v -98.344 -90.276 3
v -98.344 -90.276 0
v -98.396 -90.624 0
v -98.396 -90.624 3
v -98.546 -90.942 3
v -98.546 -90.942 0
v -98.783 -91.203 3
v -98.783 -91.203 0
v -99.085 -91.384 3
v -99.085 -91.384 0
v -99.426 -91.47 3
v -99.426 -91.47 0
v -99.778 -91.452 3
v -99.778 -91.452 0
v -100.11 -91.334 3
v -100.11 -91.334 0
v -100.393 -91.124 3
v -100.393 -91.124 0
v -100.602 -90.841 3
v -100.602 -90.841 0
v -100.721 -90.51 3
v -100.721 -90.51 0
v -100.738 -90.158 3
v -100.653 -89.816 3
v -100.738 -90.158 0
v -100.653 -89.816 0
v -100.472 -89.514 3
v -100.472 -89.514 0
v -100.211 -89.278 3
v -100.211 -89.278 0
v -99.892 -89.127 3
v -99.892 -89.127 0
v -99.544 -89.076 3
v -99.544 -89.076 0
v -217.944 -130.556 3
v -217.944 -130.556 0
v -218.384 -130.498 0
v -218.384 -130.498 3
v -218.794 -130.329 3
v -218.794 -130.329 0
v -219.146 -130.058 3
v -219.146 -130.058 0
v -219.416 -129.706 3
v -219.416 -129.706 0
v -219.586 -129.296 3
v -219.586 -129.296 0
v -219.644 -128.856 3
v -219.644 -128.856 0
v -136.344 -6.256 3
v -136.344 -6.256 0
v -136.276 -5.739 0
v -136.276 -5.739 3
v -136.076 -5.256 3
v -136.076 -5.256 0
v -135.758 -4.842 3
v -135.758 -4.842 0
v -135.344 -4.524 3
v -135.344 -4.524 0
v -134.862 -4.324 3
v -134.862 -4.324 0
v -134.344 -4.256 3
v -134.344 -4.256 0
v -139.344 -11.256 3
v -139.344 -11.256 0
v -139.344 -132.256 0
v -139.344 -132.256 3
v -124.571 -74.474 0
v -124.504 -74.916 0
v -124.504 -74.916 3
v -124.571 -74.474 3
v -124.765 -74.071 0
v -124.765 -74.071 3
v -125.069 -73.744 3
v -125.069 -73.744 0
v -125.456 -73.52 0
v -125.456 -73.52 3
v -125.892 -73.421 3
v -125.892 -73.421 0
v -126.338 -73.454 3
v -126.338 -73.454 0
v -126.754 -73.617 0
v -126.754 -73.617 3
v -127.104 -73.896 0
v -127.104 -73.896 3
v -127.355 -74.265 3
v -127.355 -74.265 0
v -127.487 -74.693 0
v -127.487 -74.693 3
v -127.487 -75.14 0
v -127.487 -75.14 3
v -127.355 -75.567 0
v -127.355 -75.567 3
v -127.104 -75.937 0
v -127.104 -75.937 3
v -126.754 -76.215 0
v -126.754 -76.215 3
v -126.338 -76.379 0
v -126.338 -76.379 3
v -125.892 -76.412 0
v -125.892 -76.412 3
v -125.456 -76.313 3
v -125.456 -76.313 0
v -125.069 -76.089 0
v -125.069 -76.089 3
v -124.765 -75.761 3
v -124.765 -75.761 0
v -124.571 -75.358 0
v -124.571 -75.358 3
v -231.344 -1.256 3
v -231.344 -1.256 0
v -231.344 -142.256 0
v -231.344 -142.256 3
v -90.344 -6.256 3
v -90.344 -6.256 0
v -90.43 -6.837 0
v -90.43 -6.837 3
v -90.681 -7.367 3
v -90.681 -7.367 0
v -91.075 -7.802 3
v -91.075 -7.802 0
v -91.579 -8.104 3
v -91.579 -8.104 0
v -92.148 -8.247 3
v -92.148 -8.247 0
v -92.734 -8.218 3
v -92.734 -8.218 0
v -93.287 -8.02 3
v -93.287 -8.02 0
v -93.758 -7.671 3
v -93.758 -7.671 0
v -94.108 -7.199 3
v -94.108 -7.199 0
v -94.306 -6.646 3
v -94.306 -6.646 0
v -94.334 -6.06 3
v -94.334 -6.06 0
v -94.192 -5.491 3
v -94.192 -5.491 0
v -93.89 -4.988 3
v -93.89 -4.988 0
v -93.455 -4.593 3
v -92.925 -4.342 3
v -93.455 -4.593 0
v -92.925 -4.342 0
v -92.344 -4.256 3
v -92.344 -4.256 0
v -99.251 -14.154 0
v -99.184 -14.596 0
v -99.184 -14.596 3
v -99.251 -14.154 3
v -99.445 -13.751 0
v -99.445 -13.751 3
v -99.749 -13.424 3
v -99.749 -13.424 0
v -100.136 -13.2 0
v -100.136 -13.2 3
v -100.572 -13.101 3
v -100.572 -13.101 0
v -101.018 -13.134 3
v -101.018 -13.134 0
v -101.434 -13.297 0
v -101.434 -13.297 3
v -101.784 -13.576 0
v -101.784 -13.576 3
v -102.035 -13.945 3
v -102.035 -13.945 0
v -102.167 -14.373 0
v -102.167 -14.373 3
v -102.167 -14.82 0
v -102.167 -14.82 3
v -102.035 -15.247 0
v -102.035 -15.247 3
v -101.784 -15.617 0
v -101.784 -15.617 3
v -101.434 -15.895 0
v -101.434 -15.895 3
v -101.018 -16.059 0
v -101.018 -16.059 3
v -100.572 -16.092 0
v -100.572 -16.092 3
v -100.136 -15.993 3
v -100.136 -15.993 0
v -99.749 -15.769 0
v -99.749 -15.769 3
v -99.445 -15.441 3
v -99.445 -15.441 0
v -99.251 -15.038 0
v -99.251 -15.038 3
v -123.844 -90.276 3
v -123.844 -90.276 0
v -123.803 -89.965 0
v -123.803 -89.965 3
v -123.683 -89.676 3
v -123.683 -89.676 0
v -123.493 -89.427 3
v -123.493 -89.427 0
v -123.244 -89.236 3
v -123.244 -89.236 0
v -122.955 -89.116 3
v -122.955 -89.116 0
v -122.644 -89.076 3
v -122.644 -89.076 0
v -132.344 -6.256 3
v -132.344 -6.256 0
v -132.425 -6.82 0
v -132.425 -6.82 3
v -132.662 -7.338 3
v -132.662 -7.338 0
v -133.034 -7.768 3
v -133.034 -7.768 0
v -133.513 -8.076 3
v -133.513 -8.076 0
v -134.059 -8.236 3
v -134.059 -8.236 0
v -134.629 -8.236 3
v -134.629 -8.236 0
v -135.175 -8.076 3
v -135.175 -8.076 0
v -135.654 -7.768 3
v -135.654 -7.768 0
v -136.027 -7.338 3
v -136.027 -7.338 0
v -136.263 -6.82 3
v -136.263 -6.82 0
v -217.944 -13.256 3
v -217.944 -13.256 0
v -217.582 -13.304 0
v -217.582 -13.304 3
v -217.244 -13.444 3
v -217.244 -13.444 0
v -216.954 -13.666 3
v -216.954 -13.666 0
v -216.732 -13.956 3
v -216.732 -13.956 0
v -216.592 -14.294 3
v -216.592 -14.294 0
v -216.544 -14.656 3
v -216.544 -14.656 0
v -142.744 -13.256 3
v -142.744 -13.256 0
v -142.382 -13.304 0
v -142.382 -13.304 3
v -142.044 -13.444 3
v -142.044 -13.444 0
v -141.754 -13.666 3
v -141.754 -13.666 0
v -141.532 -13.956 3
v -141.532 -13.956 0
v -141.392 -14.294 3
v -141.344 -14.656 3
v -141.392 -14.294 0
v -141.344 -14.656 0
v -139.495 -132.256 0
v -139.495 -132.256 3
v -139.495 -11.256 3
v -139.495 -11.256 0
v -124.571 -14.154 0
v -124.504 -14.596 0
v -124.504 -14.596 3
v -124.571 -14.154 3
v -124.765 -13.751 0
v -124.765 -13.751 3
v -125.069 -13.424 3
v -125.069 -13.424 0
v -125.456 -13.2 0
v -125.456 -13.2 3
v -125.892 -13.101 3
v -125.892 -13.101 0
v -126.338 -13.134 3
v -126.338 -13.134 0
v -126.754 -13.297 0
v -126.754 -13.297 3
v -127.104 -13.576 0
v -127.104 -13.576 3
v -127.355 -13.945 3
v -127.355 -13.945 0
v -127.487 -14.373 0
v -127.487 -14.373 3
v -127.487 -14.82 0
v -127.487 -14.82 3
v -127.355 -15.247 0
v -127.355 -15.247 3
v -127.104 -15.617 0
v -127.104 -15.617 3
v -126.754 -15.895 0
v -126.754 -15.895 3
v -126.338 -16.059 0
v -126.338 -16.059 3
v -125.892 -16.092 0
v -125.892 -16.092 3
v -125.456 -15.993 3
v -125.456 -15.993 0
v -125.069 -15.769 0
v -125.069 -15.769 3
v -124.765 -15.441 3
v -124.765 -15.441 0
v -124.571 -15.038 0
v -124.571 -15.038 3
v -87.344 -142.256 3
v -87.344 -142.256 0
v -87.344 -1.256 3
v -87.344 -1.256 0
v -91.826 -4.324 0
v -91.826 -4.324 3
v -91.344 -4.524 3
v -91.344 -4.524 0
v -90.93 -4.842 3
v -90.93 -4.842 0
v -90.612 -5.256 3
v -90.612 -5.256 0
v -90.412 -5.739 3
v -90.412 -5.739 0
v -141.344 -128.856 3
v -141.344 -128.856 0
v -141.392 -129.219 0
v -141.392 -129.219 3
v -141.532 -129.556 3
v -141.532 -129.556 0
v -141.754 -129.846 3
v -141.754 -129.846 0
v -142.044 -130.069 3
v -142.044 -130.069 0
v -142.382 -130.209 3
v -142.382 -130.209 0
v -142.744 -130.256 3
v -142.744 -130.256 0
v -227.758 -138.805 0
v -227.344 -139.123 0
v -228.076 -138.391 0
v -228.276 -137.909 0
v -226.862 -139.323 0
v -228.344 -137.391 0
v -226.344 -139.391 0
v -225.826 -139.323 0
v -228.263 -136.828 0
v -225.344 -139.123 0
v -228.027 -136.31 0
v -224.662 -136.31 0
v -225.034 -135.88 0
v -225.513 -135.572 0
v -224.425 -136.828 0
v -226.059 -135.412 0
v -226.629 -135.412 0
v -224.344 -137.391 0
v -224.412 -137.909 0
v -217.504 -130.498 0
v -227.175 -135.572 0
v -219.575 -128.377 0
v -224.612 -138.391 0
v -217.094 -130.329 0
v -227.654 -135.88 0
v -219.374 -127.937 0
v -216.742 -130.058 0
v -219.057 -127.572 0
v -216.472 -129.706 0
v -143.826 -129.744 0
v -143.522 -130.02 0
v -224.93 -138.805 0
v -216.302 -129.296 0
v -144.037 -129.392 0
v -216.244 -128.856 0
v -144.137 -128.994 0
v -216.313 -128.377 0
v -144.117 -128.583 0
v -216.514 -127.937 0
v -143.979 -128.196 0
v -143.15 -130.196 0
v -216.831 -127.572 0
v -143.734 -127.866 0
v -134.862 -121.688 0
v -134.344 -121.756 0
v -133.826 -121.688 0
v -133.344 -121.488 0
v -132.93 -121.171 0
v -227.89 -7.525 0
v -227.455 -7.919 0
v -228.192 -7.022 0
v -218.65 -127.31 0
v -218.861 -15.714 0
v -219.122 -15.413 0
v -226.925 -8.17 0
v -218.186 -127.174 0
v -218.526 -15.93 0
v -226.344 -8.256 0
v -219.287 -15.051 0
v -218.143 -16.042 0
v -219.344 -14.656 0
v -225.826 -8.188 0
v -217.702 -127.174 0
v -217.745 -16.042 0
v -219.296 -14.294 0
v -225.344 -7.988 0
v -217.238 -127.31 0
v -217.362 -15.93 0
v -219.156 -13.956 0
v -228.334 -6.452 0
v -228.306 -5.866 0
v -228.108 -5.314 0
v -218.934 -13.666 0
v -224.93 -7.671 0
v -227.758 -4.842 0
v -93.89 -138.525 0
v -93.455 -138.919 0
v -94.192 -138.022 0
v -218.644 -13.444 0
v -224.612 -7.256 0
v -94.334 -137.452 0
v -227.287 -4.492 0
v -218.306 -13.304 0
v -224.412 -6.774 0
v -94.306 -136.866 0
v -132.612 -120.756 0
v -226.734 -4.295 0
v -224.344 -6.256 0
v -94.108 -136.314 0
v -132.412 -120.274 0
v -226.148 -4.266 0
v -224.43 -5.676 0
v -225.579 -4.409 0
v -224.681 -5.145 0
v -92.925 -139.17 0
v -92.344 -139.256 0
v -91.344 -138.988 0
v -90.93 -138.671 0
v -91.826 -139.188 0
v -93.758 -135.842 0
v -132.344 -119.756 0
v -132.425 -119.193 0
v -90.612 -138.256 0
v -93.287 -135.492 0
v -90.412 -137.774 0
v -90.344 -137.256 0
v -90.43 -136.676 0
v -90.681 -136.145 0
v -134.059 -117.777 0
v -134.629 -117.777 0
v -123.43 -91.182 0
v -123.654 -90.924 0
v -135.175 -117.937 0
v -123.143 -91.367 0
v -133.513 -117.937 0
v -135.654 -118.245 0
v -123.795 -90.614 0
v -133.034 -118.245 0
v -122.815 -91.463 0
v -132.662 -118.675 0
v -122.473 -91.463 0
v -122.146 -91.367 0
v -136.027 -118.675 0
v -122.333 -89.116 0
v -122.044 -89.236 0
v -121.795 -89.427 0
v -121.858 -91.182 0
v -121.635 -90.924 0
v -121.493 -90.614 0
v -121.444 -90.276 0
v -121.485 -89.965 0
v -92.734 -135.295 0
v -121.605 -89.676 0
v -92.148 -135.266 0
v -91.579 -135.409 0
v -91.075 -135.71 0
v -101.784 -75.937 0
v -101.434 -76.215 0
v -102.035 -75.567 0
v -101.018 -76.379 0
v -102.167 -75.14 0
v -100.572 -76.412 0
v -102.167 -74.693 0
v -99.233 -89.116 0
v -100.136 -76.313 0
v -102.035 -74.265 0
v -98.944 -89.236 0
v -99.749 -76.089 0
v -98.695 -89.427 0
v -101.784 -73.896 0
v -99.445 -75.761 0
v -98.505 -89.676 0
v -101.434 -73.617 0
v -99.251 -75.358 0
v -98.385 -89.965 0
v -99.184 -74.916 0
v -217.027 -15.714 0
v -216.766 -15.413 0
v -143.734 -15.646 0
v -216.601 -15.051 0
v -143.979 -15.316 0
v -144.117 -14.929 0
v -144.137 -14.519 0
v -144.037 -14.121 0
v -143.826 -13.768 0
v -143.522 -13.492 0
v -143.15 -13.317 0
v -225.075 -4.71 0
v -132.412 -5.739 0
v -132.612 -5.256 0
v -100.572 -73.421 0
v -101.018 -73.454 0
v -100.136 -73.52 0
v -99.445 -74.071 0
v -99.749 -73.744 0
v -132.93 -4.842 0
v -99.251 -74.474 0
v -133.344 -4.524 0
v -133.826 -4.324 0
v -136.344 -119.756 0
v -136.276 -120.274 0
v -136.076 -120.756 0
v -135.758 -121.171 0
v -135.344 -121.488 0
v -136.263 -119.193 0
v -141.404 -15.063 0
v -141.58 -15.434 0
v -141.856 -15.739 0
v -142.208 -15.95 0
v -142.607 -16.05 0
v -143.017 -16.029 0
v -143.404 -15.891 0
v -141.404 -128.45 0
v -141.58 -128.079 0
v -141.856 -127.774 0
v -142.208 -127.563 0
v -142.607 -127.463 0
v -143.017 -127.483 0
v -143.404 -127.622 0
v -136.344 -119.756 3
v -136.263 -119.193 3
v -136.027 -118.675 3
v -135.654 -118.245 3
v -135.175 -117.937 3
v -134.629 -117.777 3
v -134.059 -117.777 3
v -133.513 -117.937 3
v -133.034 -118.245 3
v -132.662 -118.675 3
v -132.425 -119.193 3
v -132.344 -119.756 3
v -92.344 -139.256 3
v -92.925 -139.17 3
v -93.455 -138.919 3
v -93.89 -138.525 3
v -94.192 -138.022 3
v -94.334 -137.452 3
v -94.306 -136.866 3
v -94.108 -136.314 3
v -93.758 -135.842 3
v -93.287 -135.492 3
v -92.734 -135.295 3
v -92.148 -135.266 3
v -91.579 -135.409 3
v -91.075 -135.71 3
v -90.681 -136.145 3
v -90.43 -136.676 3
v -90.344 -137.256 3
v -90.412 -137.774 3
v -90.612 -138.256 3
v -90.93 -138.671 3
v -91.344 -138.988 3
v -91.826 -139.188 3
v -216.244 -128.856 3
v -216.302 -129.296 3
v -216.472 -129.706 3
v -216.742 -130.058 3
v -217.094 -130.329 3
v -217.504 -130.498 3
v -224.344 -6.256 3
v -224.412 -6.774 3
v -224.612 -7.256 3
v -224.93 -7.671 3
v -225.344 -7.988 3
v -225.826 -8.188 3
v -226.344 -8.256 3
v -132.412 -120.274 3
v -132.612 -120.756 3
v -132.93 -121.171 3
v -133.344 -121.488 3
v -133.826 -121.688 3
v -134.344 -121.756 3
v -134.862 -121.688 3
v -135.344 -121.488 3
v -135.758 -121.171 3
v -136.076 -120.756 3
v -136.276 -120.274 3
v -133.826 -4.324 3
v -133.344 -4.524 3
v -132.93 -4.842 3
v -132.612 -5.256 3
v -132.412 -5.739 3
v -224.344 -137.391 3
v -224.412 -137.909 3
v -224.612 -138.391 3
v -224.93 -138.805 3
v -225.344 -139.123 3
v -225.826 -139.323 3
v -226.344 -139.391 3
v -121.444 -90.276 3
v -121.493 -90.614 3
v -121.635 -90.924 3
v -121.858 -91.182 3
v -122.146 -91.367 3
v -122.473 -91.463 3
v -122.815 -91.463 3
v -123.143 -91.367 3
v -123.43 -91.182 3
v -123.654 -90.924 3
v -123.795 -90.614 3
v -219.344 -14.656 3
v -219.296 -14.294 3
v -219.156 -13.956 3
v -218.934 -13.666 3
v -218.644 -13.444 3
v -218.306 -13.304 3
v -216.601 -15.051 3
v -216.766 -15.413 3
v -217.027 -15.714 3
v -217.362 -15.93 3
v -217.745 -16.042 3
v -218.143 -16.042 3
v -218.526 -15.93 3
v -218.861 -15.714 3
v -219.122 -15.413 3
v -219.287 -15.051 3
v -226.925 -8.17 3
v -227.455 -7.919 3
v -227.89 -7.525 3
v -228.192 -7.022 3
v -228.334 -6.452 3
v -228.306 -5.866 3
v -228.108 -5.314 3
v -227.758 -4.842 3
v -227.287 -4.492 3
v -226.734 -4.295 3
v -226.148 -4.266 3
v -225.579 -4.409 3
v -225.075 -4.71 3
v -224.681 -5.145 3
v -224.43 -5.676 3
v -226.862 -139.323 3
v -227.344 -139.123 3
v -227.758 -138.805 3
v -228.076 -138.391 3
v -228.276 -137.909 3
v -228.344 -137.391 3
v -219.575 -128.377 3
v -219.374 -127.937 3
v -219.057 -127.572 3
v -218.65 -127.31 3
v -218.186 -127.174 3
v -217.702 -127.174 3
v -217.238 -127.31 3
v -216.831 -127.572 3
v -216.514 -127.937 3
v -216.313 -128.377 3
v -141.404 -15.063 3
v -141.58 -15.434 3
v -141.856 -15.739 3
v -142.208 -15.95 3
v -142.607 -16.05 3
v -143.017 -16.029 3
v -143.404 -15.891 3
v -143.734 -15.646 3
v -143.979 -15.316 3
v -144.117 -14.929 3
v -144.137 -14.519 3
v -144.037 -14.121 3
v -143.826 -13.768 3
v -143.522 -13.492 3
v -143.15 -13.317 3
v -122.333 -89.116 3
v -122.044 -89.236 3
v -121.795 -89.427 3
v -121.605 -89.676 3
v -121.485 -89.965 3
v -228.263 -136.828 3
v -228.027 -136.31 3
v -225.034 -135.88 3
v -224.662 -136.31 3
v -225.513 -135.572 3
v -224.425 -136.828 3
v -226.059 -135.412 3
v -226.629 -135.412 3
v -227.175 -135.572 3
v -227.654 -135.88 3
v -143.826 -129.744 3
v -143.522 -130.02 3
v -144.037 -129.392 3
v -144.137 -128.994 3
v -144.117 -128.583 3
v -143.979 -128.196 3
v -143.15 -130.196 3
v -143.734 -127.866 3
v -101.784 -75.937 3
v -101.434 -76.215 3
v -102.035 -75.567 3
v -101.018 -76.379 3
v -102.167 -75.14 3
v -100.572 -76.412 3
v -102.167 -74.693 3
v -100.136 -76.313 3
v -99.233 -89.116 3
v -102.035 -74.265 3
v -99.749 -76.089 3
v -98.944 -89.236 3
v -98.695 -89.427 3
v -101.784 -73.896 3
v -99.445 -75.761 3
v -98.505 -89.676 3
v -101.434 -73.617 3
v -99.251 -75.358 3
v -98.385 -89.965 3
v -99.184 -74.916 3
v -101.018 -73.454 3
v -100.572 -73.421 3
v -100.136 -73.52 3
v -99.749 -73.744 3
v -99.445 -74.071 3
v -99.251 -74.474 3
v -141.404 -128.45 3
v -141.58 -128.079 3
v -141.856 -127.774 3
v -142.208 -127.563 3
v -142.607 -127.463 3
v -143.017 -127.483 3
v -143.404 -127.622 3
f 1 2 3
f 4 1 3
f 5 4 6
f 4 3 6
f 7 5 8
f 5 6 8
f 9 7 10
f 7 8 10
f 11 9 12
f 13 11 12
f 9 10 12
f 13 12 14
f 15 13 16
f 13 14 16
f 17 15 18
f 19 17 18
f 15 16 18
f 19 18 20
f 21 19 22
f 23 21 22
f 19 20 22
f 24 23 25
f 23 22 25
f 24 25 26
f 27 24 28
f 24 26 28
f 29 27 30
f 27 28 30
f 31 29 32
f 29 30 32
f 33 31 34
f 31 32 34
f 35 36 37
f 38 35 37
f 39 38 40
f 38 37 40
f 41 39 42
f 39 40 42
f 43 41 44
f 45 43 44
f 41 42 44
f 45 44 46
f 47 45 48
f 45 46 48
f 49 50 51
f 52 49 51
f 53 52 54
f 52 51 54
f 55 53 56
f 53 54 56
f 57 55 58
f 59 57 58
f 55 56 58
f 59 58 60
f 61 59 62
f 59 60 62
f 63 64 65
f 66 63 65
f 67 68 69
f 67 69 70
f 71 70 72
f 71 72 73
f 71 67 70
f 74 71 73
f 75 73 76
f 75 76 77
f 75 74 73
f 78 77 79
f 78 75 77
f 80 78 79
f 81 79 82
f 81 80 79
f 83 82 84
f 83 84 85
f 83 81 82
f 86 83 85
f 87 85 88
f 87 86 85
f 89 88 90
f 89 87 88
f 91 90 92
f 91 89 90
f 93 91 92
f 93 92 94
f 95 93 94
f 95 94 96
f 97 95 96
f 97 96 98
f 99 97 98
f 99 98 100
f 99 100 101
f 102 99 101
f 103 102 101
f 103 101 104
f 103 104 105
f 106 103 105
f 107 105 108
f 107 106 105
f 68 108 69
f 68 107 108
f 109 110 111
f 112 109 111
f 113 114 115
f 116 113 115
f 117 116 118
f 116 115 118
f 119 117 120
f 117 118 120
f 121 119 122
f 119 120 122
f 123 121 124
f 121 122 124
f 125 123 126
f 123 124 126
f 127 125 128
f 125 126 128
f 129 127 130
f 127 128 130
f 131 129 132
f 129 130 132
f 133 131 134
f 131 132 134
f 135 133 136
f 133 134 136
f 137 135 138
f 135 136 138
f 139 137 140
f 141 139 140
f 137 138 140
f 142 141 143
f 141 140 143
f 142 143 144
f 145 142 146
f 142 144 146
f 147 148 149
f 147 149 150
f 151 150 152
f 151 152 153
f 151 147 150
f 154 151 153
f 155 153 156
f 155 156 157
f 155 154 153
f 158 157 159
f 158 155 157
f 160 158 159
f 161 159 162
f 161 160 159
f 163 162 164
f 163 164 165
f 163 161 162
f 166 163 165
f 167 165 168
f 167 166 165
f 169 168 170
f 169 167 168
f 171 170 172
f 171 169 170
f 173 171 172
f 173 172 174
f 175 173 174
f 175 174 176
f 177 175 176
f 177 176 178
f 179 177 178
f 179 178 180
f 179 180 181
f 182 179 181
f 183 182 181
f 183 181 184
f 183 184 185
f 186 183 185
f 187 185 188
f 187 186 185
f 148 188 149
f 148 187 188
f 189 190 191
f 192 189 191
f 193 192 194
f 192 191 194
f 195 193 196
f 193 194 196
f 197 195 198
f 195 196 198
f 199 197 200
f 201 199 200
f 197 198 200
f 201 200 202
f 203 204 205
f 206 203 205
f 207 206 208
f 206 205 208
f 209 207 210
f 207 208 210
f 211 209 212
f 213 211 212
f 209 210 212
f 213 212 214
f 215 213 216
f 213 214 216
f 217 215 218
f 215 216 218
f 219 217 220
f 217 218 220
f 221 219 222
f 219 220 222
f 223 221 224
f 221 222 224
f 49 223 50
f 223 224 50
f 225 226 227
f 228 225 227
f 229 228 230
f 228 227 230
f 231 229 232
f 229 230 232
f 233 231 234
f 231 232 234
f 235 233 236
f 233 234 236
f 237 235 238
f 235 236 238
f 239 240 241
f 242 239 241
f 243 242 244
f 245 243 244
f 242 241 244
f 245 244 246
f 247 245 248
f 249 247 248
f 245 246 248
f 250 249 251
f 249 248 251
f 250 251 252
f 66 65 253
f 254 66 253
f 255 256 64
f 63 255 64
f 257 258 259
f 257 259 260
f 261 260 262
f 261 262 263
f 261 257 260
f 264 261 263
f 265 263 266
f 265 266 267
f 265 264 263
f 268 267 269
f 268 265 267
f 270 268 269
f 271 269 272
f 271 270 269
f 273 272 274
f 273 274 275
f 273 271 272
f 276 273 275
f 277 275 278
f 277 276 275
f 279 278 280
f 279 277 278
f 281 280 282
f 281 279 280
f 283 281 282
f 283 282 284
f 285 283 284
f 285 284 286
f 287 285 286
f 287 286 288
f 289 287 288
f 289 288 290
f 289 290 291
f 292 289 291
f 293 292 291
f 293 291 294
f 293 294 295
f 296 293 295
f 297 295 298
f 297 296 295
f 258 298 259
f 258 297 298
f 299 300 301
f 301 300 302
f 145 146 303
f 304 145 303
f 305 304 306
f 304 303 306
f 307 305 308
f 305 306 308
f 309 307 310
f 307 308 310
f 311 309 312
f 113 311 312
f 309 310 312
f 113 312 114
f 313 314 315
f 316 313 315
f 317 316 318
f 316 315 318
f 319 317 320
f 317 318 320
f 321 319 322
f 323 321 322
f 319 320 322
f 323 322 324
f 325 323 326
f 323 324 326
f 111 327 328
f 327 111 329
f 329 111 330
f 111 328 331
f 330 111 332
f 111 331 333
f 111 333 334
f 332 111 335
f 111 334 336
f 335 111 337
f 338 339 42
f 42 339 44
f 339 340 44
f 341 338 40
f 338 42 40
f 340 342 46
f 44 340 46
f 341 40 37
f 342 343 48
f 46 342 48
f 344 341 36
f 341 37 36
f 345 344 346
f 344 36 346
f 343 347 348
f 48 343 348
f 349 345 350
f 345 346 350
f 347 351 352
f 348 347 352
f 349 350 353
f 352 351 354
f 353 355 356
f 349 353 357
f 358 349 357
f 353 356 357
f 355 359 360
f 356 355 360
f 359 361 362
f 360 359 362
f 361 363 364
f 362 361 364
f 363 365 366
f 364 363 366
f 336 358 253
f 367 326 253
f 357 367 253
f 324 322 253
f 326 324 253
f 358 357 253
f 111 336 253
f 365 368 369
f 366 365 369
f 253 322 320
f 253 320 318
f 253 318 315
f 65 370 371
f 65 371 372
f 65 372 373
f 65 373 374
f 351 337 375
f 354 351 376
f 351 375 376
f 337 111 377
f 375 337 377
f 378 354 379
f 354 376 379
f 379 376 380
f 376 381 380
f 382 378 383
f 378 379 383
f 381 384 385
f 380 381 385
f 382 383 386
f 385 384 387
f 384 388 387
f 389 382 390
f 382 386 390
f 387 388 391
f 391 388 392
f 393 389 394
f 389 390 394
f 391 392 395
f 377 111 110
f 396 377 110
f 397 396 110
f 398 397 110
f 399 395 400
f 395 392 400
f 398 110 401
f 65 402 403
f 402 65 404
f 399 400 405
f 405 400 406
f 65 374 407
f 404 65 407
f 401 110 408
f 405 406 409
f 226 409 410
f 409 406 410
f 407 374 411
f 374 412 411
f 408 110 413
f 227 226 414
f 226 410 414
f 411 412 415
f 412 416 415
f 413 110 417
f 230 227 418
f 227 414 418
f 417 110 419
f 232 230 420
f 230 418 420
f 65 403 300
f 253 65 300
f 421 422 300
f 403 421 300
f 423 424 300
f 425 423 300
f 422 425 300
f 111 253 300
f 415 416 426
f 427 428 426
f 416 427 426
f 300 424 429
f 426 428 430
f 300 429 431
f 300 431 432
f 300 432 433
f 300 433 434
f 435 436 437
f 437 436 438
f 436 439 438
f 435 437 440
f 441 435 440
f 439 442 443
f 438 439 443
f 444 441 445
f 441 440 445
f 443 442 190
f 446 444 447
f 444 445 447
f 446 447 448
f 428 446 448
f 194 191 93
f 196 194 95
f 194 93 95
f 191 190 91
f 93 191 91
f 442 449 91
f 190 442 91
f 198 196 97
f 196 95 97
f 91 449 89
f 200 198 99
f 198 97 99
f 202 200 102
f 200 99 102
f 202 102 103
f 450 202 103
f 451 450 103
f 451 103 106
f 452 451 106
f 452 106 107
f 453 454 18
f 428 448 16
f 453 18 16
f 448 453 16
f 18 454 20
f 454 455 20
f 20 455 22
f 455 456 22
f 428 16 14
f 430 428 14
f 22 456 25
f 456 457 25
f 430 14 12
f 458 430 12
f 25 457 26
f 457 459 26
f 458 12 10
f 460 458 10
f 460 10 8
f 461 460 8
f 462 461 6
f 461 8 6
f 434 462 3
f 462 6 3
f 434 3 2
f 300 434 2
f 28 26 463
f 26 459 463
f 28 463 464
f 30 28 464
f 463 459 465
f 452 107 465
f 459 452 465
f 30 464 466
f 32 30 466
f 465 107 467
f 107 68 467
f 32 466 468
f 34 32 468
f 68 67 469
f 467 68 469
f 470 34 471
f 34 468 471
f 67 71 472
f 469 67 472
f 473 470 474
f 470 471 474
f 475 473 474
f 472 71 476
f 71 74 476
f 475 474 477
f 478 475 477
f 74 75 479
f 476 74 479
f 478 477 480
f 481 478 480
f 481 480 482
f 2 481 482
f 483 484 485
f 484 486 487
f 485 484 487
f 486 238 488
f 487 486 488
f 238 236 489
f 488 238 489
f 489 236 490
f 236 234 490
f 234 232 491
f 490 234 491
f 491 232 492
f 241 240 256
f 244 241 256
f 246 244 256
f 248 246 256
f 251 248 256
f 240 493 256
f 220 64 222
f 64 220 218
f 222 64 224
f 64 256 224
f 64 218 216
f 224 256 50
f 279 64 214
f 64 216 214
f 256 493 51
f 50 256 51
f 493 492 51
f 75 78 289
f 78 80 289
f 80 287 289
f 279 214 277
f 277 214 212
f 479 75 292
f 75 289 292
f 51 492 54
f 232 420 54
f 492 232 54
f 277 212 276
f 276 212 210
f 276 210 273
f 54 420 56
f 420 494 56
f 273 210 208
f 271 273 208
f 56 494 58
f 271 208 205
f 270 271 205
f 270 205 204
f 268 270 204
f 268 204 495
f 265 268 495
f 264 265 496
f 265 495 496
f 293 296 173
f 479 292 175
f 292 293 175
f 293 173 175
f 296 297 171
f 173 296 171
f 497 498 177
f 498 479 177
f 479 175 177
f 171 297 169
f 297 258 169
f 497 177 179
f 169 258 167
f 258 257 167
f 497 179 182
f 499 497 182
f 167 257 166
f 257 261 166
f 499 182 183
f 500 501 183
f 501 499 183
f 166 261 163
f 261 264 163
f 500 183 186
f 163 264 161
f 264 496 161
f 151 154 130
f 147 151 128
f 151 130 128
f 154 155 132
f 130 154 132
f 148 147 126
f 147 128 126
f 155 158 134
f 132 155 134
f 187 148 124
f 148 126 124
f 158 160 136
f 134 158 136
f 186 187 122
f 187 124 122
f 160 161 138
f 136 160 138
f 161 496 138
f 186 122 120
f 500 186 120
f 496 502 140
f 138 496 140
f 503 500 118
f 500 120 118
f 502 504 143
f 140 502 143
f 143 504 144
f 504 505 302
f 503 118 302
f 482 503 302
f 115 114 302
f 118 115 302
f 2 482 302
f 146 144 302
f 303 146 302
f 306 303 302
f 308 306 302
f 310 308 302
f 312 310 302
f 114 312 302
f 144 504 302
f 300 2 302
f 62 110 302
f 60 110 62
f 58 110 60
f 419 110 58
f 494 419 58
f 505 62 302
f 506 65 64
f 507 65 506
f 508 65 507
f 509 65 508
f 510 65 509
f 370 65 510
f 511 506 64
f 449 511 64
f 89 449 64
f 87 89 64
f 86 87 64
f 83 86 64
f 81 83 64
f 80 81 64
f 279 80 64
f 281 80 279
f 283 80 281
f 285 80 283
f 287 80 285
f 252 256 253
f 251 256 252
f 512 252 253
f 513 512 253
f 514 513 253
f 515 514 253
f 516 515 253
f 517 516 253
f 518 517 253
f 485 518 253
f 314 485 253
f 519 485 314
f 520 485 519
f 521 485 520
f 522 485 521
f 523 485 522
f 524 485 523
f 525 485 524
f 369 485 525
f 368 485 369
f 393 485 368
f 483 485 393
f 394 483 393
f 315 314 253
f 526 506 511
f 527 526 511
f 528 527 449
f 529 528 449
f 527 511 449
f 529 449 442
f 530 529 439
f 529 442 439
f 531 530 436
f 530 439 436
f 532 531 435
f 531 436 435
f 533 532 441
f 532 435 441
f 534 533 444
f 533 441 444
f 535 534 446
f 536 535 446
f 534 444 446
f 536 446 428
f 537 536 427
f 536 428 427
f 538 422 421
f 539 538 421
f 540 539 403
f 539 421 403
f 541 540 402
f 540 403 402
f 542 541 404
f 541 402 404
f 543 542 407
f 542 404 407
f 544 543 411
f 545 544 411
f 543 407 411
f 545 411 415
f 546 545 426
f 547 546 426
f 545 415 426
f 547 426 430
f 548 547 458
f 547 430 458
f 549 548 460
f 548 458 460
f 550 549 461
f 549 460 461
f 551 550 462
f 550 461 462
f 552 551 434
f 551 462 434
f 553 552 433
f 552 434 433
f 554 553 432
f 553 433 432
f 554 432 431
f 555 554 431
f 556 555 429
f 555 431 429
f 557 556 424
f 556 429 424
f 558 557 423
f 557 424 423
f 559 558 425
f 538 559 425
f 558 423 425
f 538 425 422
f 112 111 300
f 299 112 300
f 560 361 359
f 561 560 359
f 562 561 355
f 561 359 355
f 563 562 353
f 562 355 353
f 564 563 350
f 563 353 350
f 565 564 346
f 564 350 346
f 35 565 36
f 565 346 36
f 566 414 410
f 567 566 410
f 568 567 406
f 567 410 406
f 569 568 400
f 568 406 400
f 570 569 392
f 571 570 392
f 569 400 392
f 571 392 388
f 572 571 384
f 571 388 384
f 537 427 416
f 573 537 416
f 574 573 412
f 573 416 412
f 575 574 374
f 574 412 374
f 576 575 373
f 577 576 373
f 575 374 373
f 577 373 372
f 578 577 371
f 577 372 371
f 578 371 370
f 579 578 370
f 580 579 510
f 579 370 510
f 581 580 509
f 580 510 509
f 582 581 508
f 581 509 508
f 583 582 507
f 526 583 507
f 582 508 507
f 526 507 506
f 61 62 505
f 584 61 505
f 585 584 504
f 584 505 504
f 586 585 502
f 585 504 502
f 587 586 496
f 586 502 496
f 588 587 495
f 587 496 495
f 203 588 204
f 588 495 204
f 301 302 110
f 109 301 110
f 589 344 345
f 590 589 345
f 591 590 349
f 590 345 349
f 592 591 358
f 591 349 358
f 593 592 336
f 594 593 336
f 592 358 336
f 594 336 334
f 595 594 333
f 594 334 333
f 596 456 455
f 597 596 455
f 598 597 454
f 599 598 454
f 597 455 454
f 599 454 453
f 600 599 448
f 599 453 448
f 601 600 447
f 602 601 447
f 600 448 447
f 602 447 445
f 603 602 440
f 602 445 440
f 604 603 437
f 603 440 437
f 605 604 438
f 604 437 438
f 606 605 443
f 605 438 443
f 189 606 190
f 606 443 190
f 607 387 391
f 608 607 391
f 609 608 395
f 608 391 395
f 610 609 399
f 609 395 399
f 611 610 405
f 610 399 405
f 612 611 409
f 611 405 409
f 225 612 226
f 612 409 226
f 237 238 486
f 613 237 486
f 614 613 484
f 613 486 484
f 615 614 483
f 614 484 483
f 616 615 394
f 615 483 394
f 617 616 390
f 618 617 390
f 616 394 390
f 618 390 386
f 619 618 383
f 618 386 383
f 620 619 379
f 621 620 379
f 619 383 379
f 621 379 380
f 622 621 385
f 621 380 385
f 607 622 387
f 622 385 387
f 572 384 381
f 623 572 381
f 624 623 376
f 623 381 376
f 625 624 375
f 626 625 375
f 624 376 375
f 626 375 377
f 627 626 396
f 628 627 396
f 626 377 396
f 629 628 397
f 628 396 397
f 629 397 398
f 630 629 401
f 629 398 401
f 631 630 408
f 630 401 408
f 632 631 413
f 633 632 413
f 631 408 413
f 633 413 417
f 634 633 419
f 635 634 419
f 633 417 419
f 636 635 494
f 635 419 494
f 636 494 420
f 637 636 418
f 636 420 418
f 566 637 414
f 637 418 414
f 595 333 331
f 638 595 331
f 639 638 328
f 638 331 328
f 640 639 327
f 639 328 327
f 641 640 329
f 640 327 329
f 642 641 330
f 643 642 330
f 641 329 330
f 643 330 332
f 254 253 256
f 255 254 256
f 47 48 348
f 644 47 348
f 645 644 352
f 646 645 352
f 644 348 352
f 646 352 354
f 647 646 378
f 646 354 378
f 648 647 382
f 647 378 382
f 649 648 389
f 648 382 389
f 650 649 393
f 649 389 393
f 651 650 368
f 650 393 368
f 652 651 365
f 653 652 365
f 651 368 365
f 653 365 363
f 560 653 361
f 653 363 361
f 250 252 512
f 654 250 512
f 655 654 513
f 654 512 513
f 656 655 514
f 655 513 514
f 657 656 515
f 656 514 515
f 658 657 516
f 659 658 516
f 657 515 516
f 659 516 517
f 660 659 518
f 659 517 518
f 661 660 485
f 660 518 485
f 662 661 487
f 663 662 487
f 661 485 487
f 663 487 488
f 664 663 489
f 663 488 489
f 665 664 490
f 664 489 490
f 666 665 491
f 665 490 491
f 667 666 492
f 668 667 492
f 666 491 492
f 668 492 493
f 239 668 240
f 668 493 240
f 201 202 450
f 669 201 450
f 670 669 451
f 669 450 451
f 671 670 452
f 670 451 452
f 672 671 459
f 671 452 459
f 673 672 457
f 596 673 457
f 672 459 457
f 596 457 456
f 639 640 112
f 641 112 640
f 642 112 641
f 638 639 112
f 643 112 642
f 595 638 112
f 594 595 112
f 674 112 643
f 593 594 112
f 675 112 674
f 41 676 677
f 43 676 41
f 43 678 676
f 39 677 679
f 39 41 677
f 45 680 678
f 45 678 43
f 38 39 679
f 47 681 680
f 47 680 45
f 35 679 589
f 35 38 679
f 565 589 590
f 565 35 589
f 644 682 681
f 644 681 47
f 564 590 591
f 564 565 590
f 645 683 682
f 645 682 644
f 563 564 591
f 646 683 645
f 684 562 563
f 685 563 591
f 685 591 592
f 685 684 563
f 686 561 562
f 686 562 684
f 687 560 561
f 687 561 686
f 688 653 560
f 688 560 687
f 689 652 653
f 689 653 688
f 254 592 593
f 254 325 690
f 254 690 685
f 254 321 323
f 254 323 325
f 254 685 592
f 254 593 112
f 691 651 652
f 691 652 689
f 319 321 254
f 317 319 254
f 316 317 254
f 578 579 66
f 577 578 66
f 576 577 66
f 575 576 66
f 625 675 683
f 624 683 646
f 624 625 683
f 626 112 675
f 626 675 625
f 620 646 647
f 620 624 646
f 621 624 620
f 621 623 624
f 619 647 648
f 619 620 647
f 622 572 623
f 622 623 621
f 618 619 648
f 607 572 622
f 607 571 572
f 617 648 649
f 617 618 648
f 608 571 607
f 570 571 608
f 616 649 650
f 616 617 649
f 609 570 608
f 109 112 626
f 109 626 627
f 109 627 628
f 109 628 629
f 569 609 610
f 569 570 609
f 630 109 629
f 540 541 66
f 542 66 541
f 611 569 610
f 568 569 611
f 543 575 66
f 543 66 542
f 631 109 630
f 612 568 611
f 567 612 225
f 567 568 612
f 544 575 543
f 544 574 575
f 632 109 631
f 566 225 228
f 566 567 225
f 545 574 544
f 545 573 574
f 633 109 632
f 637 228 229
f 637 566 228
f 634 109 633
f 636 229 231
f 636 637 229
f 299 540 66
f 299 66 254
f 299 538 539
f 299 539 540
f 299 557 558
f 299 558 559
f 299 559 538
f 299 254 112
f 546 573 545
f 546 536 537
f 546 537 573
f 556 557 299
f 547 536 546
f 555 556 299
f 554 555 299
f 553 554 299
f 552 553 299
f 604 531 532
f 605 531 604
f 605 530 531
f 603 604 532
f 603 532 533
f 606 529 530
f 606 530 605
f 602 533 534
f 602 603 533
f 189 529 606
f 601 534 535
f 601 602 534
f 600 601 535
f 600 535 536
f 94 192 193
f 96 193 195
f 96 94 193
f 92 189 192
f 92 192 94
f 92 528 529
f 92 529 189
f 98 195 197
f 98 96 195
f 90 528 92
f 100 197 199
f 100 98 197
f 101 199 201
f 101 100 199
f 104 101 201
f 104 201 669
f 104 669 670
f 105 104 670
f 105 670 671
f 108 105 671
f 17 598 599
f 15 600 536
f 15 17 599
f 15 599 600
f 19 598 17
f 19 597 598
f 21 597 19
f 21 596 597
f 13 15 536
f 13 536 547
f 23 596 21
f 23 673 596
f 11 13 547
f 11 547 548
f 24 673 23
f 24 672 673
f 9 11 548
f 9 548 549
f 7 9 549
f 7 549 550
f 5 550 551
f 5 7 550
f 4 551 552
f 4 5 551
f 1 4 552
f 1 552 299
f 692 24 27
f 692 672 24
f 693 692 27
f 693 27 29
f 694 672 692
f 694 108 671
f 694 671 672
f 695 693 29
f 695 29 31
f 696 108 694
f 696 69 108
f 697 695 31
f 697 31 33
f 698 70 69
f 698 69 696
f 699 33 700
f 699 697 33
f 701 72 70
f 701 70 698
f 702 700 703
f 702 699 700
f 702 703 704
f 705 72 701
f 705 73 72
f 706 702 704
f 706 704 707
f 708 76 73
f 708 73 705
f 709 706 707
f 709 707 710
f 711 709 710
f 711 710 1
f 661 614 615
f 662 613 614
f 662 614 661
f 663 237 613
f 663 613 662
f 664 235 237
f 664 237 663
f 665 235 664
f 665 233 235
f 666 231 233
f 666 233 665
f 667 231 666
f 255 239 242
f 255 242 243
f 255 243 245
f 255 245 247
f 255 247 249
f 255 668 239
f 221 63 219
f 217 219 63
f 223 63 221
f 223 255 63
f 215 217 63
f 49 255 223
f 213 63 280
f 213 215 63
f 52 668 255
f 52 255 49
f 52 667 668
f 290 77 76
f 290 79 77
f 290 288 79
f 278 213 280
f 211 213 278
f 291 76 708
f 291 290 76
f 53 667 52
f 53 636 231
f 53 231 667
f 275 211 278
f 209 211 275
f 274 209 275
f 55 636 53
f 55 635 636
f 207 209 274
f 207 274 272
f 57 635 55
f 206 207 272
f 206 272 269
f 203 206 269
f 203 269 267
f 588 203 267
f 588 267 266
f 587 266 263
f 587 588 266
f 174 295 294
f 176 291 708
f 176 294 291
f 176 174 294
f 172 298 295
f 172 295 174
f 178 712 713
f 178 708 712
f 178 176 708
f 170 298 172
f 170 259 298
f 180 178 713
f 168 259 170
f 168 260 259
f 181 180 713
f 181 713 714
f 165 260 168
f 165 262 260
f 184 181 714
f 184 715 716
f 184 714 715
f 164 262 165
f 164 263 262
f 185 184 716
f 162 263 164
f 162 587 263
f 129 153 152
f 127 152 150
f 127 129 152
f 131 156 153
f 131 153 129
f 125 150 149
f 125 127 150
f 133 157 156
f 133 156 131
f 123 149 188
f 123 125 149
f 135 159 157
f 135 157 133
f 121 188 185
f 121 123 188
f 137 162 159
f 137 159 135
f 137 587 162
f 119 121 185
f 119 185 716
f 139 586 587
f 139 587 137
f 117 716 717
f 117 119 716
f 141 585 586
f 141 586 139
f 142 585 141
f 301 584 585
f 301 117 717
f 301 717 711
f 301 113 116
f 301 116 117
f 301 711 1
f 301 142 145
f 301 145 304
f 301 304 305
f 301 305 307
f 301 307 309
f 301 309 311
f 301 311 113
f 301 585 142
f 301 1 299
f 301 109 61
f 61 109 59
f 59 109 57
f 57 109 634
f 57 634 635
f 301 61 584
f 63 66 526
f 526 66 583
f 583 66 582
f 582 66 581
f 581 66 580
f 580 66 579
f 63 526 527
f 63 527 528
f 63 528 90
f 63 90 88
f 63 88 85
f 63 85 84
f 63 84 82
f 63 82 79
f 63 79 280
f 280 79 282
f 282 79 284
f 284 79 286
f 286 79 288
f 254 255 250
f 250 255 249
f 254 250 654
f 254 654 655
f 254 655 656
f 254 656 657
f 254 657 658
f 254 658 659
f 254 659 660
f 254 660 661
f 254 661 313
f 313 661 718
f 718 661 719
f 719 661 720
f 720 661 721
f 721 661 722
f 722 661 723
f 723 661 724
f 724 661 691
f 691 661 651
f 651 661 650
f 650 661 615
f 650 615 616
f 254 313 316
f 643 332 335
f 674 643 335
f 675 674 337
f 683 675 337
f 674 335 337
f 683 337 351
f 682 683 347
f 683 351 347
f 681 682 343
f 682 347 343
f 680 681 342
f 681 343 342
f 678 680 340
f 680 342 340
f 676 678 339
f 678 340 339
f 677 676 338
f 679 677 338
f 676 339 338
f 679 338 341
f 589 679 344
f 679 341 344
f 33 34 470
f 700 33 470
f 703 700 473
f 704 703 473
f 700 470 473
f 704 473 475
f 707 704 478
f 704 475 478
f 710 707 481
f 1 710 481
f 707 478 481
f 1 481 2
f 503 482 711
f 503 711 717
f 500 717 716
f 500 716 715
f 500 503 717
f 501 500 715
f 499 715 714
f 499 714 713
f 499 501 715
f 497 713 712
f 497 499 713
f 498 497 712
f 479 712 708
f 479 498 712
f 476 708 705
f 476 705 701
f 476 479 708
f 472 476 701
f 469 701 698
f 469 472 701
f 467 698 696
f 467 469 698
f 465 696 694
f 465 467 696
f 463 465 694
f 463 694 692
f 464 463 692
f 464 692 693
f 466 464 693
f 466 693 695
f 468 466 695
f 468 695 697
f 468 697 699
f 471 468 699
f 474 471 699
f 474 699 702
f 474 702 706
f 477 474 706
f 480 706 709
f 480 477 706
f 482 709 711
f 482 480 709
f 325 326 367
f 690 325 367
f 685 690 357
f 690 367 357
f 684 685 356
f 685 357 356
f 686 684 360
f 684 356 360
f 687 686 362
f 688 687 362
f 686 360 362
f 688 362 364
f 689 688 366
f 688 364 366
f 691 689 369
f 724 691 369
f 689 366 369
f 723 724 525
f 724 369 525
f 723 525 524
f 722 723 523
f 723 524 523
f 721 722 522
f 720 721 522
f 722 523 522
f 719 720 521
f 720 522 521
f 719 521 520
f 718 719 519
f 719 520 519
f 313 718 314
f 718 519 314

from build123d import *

# Parameters (mm, degrees)
F0_R     = 1.5
F0_W     = 3
F0_H     = 5
F0_W_2   = 4
F0_H_2   = 75.28
F0_H_3   = 40.64
F0_H_4   = 5.08
F1_DEPTH = 3


# Not quite as in the source:
# - a feature names something its author has since deleted; it is built from what else it names


with BuildPart() as f1:
    # F0 (on Top) → F1 (new body)
    with BuildSketch(Plane.XY):
        with BuildLine():
            Line((-134.3440142274, -1.256315279), (-139.3440142274, -1.256315279))
            Line((-139.3440142274, -1.256315279), (-139.3440142274, -6.256315279))
            Line((-139.3440142274, -6.256315279), (-136.3440142274, -6.256315279))
            ThreePointArc((-136.3440142274, -6.256315279), (-135.7582277898, -4.8421017166), (-134.3440142274, -4.256315279))
            Line((-134.3440142274, -4.256315279), (-134.3440142274, -1.256315279))
        make_face()
        Polygon((-139.3440142274, -6.256315279), (-139.3440142274, -1.256315279), (-221.3440142274, -1.256315279), (-221.3440142274, -6.256315279), (-221.3440142274, -11.256315279), (-217.9440142274, -11.256315279), (-151.4240142274, -11.256315279), (-147.4240142274, -11.256315279), (-142.7440142274, -11.256315279), (-139.4949736476, -11.256315279), (-139.3440142274, -11.256315279), align=None)
        with BuildLine():
            Line((-129.3440142274, -1.256315279), (-134.3440142274, -1.256315279))
            Line((-134.3440142274, -1.256315279), (-134.3440142274, -4.256315279))
            ThreePointArc((-134.3440142274, -4.256315279), (-132.929800665, -4.8421017166), (-132.3440142274, -6.256315279))
            ThreePointArc((-132.3440142274, -6.256315279), (-134.3440142274, -8.256315279), (-136.3440142274, -6.256315279))
            Line((-136.3440142274, -6.256315279), (-139.3440142274, -6.256315279))
            Line((-139.3440142274, -6.256315279), (-139.3440142274, -11.256315279))
            Line((-139.3440142274, -11.256315279), (-129.3440142274, -11.256315279))
            Line((-129.3440142274, -11.256315279), (-129.3440142274, -6.256315279))
            Line((-129.3440142274, -6.256315279), (-129.3440142274, -1.256315279))
        make_face()
        with BuildLine():
            Line((-221.3440142274, -6.256315279), (-221.3440142274, -1.256315279))
            Line((-221.3440142274, -1.256315279), (-231.3440142274, -1.256315279))
            Line((-231.3440142274, -1.256315279), (-231.3440142274, -132.256315279))
            Line((-231.3440142274, -132.256315279), (-221.3440142274, -132.256315279))
            Line((-221.3440142274, -132.256315279), (-221.3440142274, -128.856315279))
            Line((-221.3440142274, -128.856315279), (-221.3440142274, -14.656315279))
            Line((-221.3440142274, -14.656315279), (-221.3440142274, -11.256315279))
            Line((-221.3440142274, -11.256315279), (-226.3440142274, -11.256315279))
            Line((-226.3440142274, -11.256315279), (-226.3440142274, -8.256315279))
            ThreePointArc((-226.3440142274, -8.256315279), (-227.7582277898, -4.8421017166), (-224.3440142274, -6.256315279))
            Line((-224.3440142274, -6.256315279), (-221.3440142274, -6.256315279))
        make_face()
        with BuildLine():
            Line((-92.3440142274, -1.256315279), (-129.3440142274, -1.256315279))
            Line((-129.3440142274, -1.256315279), (-129.3440142274, -6.256315279))
            Line((-129.3440142274, -6.256315279), (-126.3440142274, -6.256315279))
            Line((-126.3440142274, -6.256315279), (-100.3440142274, -6.256315279))
            Line((-100.3440142274, -6.256315279), (-97.3440142274, -6.256315279))
            Line((-97.3440142274, -6.256315279), (-97.3440142274, -11.256315279))
            Line((-97.3440142274, -11.256315279), (-97.3440142274, -14.596315279))
            Line((-97.3440142274, -14.596315279), (-97.3440142274, -74.916315279))
            Line((-97.3440142274, -74.916315279), (-97.3440142274, -78.256315279))
            Line((-97.3440142274, -78.256315279), (-100.6840142274, -78.256315279))
            Line((-100.6840142274, -78.256315279), (-126.0040142274, -78.256315279))
            Line((-126.0040142274, -78.256315279), (-129.3440142274, -78.256315279))
            Line((-129.3440142274, -78.256315279), (-129.3440142274, -108.756315279))
            Line((-129.3440142274, -108.756315279), (-129.3440142274, -111.756315279))
            Line((-129.3440142274, -111.756315279), (-129.3440142274, -114.756315279))
            Line((-129.3440142274, -114.756315279), (-129.3440142274, -124.756315279))
            Line((-129.3440142274, -124.756315279), (-129.3440142274, -142.256315279))
            Line((-129.3440142274, -142.256315279), (-92.3440142274, -142.256315279))
            Line((-92.3440142274, -142.256315279), (-92.3440142274, -139.256315279))
            ThreePointArc((-92.3440142274, -139.256315279), (-93.7582277898, -135.8421017166), (-90.3440142274, -137.256315279))
            Line((-90.3440142274, -137.256315279), (-87.3440142274, -137.256315279))
            Line((-87.3440142274, -137.256315279), (-87.3440142274, -6.256315279))
            Line((-87.3440142274, -6.256315279), (-90.3440142274, -6.256315279))
            ThreePointArc((-90.3440142274, -6.256315279), (-93.7582277898, -7.6705288414), (-92.3440142274, -4.256315279))
            Line((-92.3440142274, -4.256315279), (-92.3440142274, -1.256315279))
        make_face()
        Polygon((-97.8440142274, -124.5755243927), (-124.3440142274, -124.5755243927), (-124.3440142274, -90.2755243927), (-124.3440142274, -88.5755243927), (-122.6440142274, -88.5755243927), (-99.5440142274, -88.5755243927), (-97.8440142274, -88.5755243927), (-97.8440142274, -90.2755243927), align=None, mode=Mode.SUBTRACT)
        Polygon((-129.3440142274, -11.256315279), (-139.3440142274, -11.256315279), (-139.3440142274, -14.656315279), (-139.3440142274, -114.756315279), (-129.3440142274, -114.756315279), (-129.3440142274, -111.756315279), (-129.3440142274, -108.756315279), (-129.3440142274, -78.256315279), (-129.3440142274, -74.916315279), (-129.3440142274, -27.956315279), (-129.3440142274, -27.456315279), (-129.3440142274, -14.596315279), (-129.3440142274, -14.056315279), align=None)
        with BuildLine():
            Line((-221.3440142274, -11.256315279), (-221.3440142274, -6.256315279))
            Line((-221.3440142274, -6.256315279), (-224.3440142274, -6.256315279))
            ThreePointArc((-224.3440142274, -6.256315279), (-224.929800665, -7.6705288414), (-226.3440142274, -8.256315279))
            Line((-226.3440142274, -8.256315279), (-226.3440142274, -11.256315279))
            Line((-226.3440142274, -11.256315279), (-221.3440142274, -11.256315279))
        make_face()
        Polygon((-126.3440142274, -6.256315279), (-129.3440142274, -6.256315279), (-129.3440142274, -11.256315279), (-126.5440142274, -11.256315279), (-126.3440142274, -11.256315279), align=None)
        with BuildLine():
            Line((-87.3440142274, -1.256315279), (-92.3440142274, -1.256315279))
            Line((-92.3440142274, -1.256315279), (-92.3440142274, -4.256315279))
            ThreePointArc((-92.3440142274, -4.256315279), (-90.929800665, -4.8421017166), (-90.3440142274, -6.256315279))
            Line((-90.3440142274, -6.256315279), (-87.3440142274, -6.256315279))
            Line((-87.3440142274, -6.256315279), (-87.3440142274, -1.256315279))
        make_face()
        Polygon((-126.5440142274, -11.256315279), (-129.3440142274, -11.256315279), (-129.3440142274, -14.056315279), (-129.3440142274, -14.596315279), (-129.3440142274, -27.456315279), (-129.3440142274, -27.956315279), (-129.3440142274, -74.916315279), (-129.3440142274, -78.256315279), (-126.0040142274, -78.256315279), (-100.6840142274, -78.256315279), (-97.3440142274, -78.256315279), (-97.3440142274, -74.916315279), (-97.3440142274, -14.596315279), (-97.3440142274, -11.256315279), (-100.3440142274, -11.256315279), (-100.6840142274, -11.256315279), (-126.0040142274, -11.256315279), (-126.3440142274, -11.256315279), align=None)
        with Locations((-126.0040142274, -74.916315279)):
            Circle(F0_R, mode=Mode.SUBTRACT)
        with Locations((-100.6840142274, -74.916315279)):
            Circle(F0_R, mode=Mode.SUBTRACT)
        with Locations((-126.0040142274, -14.596315279)):
            Circle(F0_R, mode=Mode.SUBTRACT)
        with Locations((-100.6840142274, -14.596315279)):
            Circle(F0_R, mode=Mode.SUBTRACT)
        with BuildLine():
            Line((-139.4949736476, -14.656315279), (-139.4949736476, -11.256315279))
            Line((-139.4949736476, -11.256315279), (-142.7440142274, -11.256315279))
            Line((-142.7440142274, -11.256315279), (-142.7440142274, -13.256315279))
            ThreePointArc((-142.7440142274, -13.256315279), (-141.7540647337, -13.6663657853), (-141.3440142274, -14.656315279))
            Line((-141.3440142274, -14.656315279), (-139.4949736476, -14.656315279))
        make_face()
        with BuildLine():
            Line((-217.9440142274, -11.256315279), (-221.3440142274, -11.256315279))
            Line((-221.3440142274, -11.256315279), (-221.3440142274, -14.656315279))
            Line((-221.3440142274, -14.656315279), (-219.3440142274, -14.656315279))
            ThreePointArc((-219.3440142274, -14.656315279), (-218.9339637211, -13.6663657853), (-217.9440142274, -13.256315279))
            Line((-217.9440142274, -13.256315279), (-217.9440142274, -11.256315279))
        make_face()
        with BuildLine():
            Line((-221.3440142274, -132.256315279), (-231.3440142274, -132.256315279))
            Line((-231.3440142274, -132.256315279), (-231.3440142274, -137.3912245035))
            Line((-231.3440142274, -137.3912245035), (-228.3440142274, -137.3912245035))
            ThreePointArc((-228.3440142274, -137.3912245035), (-226.3440142274, -135.3912245035), (-224.3440142274, -137.3912245035))
            ThreePointArc((-224.3440142274, -137.3912245035), (-224.929800665, -138.8054380659), (-226.3440142274, -139.3912245035))
            Line((-226.3440142274, -139.3912245035), (-226.3440142274, -142.256315279))
            Line((-226.3440142274, -142.256315279), (-221.3440142274, -142.256315279))
            Line((-221.3440142274, -142.256315279), (-221.3440142274, -132.256315279))
        make_face()
        Polygon((-100.3440142274, -6.256315279), (-126.3440142274, -6.256315279), (-126.3440142274, -11.256315279), (-126.0040142274, -11.256315279), (-100.6840142274, -11.256315279), (-100.3440142274, -11.256315279), align=None)
        with BuildLine():
            Line((-139.4949736476, -128.856315279), (-139.4949736476, -14.656315279))
            Line((-139.4949736476, -14.656315279), (-141.3440142274, -14.656315279))
            ThreePointArc((-141.3440142274, -14.656315279), (-143.7339637211, -15.6462647727), (-142.7440142274, -13.256315279))
            Line((-142.7440142274, -13.256315279), (-142.7440142274, -11.256315279))
            Line((-142.7440142274, -11.256315279), (-147.4240142274, -11.256315279))
            Line((-147.4240142274, -11.256315279), (-147.4240142274, -86.536315279))
            Line((-147.4240142274, -86.536315279), (-147.4240142274, -127.176315279))
            Line((-147.4240142274, -127.176315279), (-147.4240142274, -132.256315279))
            Line((-147.4240142274, -132.256315279), (-142.7440142274, -132.256315279))
            Line((-142.7440142274, -132.256315279), (-142.7440142274, -130.256315279))
            ThreePointArc((-142.7440142274, -130.256315279), (-143.7339637211, -127.8663657853), (-141.3440142274, -128.856315279))
            Line((-141.3440142274, -128.856315279), (-139.4949736476, -128.856315279))
        make_face()
        with BuildLine():
            Line((-129.3440142274, -114.756315279), (-139.3440142274, -114.756315279))
            Line((-139.3440142274, -114.756315279), (-139.3440142274, -119.756315279))
            Line((-139.3440142274, -119.756315279), (-136.3440142274, -119.756315279))
            ThreePointArc((-136.3440142274, -119.756315279), (-134.3440142274, -117.756315279), (-132.3440142274, -119.756315279))
            ThreePointArc((-132.3440142274, -119.756315279), (-132.929800665, -121.1705288414), (-134.3440142274, -121.756315279))
            Line((-134.3440142274, -121.756315279), (-134.3440142274, -124.756315279))
            Line((-134.3440142274, -124.756315279), (-129.3440142274, -124.756315279))
            Line((-129.3440142274, -124.756315279), (-129.3440142274, -114.756315279))
        make_face()
        with BuildLine():
            Line((-151.4240142274, -11.256315279), (-217.9440142274, -11.256315279))
            Line((-217.9440142274, -11.256315279), (-217.9440142274, -13.256315279))
            ThreePointArc((-217.9440142274, -13.256315279), (-216.9540647337, -13.6663657853), (-216.5440142274, -14.656315279))
            ThreePointArc((-216.5440142274, -14.656315279), (-217.9440142274, -16.056315279), (-219.3440142274, -14.656315279))
            Line((-219.3440142274, -14.656315279), (-221.3440142274, -14.656315279))
            Line((-221.3440142274, -14.656315279), (-221.3440142274, -128.856315279))
            Line((-221.3440142274, -128.856315279), (-219.6440142274, -128.856315279))
            ThreePointArc((-219.6440142274, -128.856315279), (-217.9440142274, -127.156315279), (-216.2440142274, -128.856315279))
            ThreePointArc((-216.2440142274, -128.856315279), (-216.7419326994, -130.058396807), (-217.9440142274, -130.556315279))
            Line((-217.9440142274, -130.556315279), (-217.9440142274, -132.256315279))
            Line((-217.9440142274, -132.256315279), (-151.4240142274, -132.256315279))
            Line((-151.4240142274, -132.256315279), (-151.4240142274, -127.176315279))
            Line((-151.4240142274, -127.176315279), (-151.4240142274, -86.536315279))
            Line((-151.4240142274, -86.536315279), (-151.4240142274, -11.256315279))
        make_face()
        with BuildLine():
            Line((-221.3440142274, -128.856315279), (-221.3440142274, -132.256315279))
            Line((-221.3440142274, -132.256315279), (-217.9440142274, -132.256315279))
            Line((-217.9440142274, -132.256315279), (-217.9440142274, -130.556315279))
            ThreePointArc((-217.9440142274, -130.556315279), (-219.1460957554, -130.058396807), (-219.6440142274, -128.856315279))
            Line((-219.6440142274, -128.856315279), (-221.3440142274, -128.856315279))
        make_face()
        Polygon((-217.9440142274, -132.256315279), (-221.3440142274, -132.256315279), (-221.3440142274, -142.256315279), (-139.3440142274, -142.256315279), (-139.4949736476, -132.256315279), (-142.7440142274, -132.256315279), (-147.4240142274, -132.256315279), (-151.4240142274, -132.256315279), align=None)
        with BuildLine():
            Line((-228.3440142274, -137.3912245035), (-231.3440142274, -137.3912245035))
            Line((-231.3440142274, -137.3912245035), (-231.3440142274, -142.256315279))
            Line((-231.3440142274, -142.256315279), (-226.3440142274, -142.256315279))
            Line((-226.3440142274, -142.256315279), (-226.3440142274, -139.3912245035))
            ThreePointArc((-226.3440142274, -139.3912245035), (-227.7582277898, -138.8054380659), (-228.3440142274, -137.3912245035))
        make_face()
        with Locations((-98.8440142274, -8.756315279)):
            Rectangle(F0_W, F0_H)
        with BuildLine():
            Line((-139.4949736476, -132.256315279), (-139.4949736476, -128.856315279))
            Line((-139.4949736476, -128.856315279), (-141.3440142274, -128.856315279))
            ThreePointArc((-141.3440142274, -128.856315279), (-141.7540647337, -129.8462647727), (-142.7440142274, -130.256315279))
            Line((-142.7440142274, -130.256315279), (-142.7440142274, -132.256315279))
            Line((-142.7440142274, -132.256315279), (-139.4949736476, -132.256315279))
        make_face()
        with Locations((-149.4240142274, -48.896315279)):
            Rectangle(F0_W_2, F0_H_2)
        with BuildLine():
            Line((-136.3440142274, -119.756315279), (-139.3440142274, -119.756315279))
            Line((-139.3440142274, -119.756315279), (-139.3440142274, -124.756315279))
            Line((-139.3440142274, -124.756315279), (-139.1930548072, -124.756315279))
            Line((-139.1930548072, -124.756315279), (-134.3440142274, -124.756315279))
            Line((-134.3440142274, -124.756315279), (-134.3440142274, -121.756315279))
            ThreePointArc((-134.3440142274, -121.756315279), (-135.7582277898, -121.1705288414), (-136.3440142274, -119.756315279))
        make_face()
        with BuildLine():
            Line((-87.3440142274, -142.256315279), (-87.3440142274, -137.256315279))
            Line((-87.3440142274, -137.256315279), (-90.3440142274, -137.256315279))
            ThreePointArc((-90.3440142274, -137.256315279), (-90.929800665, -138.6705288414), (-92.3440142274, -139.256315279))
            Line((-92.3440142274, -139.256315279), (-92.3440142274, -142.256315279))
            Line((-92.3440142274, -142.256315279), (-87.3440142274, -142.256315279))
        make_face()
        Polygon((-139.3440142274, -132.256315279), (-139.4949736476, -132.256315279), (-139.3440142274, -142.256315279), (-129.3440142274, -142.256315279), (-129.3440142274, -124.756315279), (-134.3440142274, -124.756315279), (-139.1930548072, -124.756315279), (-139.3440142274, -124.756315279), (-139.3440142274, -128.856315279), align=None)
        with Locations((-149.4240142274, -106.856315279)):
            Rectangle(F0_W_2, F0_H_3)
        with Locations((-149.4240142274, -129.716315279)):
            Rectangle(F0_W_2, F0_H_4)
        with BuildLine():
            Line((-124.3440142274, -90.2755243927), (-124.3440142274, -124.5755243927))
            Line((-124.3440142274, -124.5755243927), (-97.8440142274, -124.5755243927))
            Line((-97.8440142274, -124.5755243927), (-97.8440142274, -90.2755243927))
            Line((-97.8440142274, -90.2755243927), (-98.3440142274, -90.2755243927))
            ThreePointArc((-98.3440142274, -90.2755243927), (-100.3925423648, -91.1240525301), (-99.5440142274, -89.0755243927))
            Line((-99.5440142274, -89.0755243927), (-99.5440142274, -88.5755243927))
            Line((-99.5440142274, -88.5755243927), (-122.6440142274, -88.5755243927))
            Line((-122.6440142274, -88.5755243927), (-122.6440142274, -89.0755243927))
            ThreePointArc((-122.6440142274, -89.0755243927), (-121.79548609, -89.4269962553), (-121.4440142274, -90.2755243927))
            ThreePointArc((-121.4440142274, -90.2755243927), (-122.6440142274, -91.4755243927), (-123.8440142274, -90.2755243927))
            Line((-123.8440142274, -90.2755243927), (-124.3440142274, -90.2755243927))
        make_face()
        with BuildLine():
            Line((-124.3440142274, -88.5755243927), (-124.3440142274, -90.2755243927))
            Line((-124.3440142274, -90.2755243927), (-123.8440142274, -90.2755243927))
            ThreePointArc((-123.8440142274, -90.2755243927), (-123.4925423648, -89.4269962553), (-122.6440142274, -89.0755243927))
            Line((-122.6440142274, -89.0755243927), (-122.6440142274, -88.5755243927))
            Line((-122.6440142274, -88.5755243927), (-124.3440142274, -88.5755243927))
        make_face()
        with BuildLine():
            Line((-98.3440142274, -90.2755243927), (-97.8440142274, -90.2755243927))
            Line((-97.8440142274, -90.2755243927), (-97.8440142274, -88.5755243927))
            Line((-97.8440142274, -88.5755243927), (-99.5440142274, -88.5755243927))
            Line((-99.5440142274, -88.5755243927), (-99.5440142274, -89.0755243927))
            ThreePointArc((-99.5440142274, -89.0755243927), (-98.69548609, -89.4269962553), (-98.3440142274, -90.2755243927))
        make_face()
    extrude(amount=F1_DEPTH)


solid = f1.part
